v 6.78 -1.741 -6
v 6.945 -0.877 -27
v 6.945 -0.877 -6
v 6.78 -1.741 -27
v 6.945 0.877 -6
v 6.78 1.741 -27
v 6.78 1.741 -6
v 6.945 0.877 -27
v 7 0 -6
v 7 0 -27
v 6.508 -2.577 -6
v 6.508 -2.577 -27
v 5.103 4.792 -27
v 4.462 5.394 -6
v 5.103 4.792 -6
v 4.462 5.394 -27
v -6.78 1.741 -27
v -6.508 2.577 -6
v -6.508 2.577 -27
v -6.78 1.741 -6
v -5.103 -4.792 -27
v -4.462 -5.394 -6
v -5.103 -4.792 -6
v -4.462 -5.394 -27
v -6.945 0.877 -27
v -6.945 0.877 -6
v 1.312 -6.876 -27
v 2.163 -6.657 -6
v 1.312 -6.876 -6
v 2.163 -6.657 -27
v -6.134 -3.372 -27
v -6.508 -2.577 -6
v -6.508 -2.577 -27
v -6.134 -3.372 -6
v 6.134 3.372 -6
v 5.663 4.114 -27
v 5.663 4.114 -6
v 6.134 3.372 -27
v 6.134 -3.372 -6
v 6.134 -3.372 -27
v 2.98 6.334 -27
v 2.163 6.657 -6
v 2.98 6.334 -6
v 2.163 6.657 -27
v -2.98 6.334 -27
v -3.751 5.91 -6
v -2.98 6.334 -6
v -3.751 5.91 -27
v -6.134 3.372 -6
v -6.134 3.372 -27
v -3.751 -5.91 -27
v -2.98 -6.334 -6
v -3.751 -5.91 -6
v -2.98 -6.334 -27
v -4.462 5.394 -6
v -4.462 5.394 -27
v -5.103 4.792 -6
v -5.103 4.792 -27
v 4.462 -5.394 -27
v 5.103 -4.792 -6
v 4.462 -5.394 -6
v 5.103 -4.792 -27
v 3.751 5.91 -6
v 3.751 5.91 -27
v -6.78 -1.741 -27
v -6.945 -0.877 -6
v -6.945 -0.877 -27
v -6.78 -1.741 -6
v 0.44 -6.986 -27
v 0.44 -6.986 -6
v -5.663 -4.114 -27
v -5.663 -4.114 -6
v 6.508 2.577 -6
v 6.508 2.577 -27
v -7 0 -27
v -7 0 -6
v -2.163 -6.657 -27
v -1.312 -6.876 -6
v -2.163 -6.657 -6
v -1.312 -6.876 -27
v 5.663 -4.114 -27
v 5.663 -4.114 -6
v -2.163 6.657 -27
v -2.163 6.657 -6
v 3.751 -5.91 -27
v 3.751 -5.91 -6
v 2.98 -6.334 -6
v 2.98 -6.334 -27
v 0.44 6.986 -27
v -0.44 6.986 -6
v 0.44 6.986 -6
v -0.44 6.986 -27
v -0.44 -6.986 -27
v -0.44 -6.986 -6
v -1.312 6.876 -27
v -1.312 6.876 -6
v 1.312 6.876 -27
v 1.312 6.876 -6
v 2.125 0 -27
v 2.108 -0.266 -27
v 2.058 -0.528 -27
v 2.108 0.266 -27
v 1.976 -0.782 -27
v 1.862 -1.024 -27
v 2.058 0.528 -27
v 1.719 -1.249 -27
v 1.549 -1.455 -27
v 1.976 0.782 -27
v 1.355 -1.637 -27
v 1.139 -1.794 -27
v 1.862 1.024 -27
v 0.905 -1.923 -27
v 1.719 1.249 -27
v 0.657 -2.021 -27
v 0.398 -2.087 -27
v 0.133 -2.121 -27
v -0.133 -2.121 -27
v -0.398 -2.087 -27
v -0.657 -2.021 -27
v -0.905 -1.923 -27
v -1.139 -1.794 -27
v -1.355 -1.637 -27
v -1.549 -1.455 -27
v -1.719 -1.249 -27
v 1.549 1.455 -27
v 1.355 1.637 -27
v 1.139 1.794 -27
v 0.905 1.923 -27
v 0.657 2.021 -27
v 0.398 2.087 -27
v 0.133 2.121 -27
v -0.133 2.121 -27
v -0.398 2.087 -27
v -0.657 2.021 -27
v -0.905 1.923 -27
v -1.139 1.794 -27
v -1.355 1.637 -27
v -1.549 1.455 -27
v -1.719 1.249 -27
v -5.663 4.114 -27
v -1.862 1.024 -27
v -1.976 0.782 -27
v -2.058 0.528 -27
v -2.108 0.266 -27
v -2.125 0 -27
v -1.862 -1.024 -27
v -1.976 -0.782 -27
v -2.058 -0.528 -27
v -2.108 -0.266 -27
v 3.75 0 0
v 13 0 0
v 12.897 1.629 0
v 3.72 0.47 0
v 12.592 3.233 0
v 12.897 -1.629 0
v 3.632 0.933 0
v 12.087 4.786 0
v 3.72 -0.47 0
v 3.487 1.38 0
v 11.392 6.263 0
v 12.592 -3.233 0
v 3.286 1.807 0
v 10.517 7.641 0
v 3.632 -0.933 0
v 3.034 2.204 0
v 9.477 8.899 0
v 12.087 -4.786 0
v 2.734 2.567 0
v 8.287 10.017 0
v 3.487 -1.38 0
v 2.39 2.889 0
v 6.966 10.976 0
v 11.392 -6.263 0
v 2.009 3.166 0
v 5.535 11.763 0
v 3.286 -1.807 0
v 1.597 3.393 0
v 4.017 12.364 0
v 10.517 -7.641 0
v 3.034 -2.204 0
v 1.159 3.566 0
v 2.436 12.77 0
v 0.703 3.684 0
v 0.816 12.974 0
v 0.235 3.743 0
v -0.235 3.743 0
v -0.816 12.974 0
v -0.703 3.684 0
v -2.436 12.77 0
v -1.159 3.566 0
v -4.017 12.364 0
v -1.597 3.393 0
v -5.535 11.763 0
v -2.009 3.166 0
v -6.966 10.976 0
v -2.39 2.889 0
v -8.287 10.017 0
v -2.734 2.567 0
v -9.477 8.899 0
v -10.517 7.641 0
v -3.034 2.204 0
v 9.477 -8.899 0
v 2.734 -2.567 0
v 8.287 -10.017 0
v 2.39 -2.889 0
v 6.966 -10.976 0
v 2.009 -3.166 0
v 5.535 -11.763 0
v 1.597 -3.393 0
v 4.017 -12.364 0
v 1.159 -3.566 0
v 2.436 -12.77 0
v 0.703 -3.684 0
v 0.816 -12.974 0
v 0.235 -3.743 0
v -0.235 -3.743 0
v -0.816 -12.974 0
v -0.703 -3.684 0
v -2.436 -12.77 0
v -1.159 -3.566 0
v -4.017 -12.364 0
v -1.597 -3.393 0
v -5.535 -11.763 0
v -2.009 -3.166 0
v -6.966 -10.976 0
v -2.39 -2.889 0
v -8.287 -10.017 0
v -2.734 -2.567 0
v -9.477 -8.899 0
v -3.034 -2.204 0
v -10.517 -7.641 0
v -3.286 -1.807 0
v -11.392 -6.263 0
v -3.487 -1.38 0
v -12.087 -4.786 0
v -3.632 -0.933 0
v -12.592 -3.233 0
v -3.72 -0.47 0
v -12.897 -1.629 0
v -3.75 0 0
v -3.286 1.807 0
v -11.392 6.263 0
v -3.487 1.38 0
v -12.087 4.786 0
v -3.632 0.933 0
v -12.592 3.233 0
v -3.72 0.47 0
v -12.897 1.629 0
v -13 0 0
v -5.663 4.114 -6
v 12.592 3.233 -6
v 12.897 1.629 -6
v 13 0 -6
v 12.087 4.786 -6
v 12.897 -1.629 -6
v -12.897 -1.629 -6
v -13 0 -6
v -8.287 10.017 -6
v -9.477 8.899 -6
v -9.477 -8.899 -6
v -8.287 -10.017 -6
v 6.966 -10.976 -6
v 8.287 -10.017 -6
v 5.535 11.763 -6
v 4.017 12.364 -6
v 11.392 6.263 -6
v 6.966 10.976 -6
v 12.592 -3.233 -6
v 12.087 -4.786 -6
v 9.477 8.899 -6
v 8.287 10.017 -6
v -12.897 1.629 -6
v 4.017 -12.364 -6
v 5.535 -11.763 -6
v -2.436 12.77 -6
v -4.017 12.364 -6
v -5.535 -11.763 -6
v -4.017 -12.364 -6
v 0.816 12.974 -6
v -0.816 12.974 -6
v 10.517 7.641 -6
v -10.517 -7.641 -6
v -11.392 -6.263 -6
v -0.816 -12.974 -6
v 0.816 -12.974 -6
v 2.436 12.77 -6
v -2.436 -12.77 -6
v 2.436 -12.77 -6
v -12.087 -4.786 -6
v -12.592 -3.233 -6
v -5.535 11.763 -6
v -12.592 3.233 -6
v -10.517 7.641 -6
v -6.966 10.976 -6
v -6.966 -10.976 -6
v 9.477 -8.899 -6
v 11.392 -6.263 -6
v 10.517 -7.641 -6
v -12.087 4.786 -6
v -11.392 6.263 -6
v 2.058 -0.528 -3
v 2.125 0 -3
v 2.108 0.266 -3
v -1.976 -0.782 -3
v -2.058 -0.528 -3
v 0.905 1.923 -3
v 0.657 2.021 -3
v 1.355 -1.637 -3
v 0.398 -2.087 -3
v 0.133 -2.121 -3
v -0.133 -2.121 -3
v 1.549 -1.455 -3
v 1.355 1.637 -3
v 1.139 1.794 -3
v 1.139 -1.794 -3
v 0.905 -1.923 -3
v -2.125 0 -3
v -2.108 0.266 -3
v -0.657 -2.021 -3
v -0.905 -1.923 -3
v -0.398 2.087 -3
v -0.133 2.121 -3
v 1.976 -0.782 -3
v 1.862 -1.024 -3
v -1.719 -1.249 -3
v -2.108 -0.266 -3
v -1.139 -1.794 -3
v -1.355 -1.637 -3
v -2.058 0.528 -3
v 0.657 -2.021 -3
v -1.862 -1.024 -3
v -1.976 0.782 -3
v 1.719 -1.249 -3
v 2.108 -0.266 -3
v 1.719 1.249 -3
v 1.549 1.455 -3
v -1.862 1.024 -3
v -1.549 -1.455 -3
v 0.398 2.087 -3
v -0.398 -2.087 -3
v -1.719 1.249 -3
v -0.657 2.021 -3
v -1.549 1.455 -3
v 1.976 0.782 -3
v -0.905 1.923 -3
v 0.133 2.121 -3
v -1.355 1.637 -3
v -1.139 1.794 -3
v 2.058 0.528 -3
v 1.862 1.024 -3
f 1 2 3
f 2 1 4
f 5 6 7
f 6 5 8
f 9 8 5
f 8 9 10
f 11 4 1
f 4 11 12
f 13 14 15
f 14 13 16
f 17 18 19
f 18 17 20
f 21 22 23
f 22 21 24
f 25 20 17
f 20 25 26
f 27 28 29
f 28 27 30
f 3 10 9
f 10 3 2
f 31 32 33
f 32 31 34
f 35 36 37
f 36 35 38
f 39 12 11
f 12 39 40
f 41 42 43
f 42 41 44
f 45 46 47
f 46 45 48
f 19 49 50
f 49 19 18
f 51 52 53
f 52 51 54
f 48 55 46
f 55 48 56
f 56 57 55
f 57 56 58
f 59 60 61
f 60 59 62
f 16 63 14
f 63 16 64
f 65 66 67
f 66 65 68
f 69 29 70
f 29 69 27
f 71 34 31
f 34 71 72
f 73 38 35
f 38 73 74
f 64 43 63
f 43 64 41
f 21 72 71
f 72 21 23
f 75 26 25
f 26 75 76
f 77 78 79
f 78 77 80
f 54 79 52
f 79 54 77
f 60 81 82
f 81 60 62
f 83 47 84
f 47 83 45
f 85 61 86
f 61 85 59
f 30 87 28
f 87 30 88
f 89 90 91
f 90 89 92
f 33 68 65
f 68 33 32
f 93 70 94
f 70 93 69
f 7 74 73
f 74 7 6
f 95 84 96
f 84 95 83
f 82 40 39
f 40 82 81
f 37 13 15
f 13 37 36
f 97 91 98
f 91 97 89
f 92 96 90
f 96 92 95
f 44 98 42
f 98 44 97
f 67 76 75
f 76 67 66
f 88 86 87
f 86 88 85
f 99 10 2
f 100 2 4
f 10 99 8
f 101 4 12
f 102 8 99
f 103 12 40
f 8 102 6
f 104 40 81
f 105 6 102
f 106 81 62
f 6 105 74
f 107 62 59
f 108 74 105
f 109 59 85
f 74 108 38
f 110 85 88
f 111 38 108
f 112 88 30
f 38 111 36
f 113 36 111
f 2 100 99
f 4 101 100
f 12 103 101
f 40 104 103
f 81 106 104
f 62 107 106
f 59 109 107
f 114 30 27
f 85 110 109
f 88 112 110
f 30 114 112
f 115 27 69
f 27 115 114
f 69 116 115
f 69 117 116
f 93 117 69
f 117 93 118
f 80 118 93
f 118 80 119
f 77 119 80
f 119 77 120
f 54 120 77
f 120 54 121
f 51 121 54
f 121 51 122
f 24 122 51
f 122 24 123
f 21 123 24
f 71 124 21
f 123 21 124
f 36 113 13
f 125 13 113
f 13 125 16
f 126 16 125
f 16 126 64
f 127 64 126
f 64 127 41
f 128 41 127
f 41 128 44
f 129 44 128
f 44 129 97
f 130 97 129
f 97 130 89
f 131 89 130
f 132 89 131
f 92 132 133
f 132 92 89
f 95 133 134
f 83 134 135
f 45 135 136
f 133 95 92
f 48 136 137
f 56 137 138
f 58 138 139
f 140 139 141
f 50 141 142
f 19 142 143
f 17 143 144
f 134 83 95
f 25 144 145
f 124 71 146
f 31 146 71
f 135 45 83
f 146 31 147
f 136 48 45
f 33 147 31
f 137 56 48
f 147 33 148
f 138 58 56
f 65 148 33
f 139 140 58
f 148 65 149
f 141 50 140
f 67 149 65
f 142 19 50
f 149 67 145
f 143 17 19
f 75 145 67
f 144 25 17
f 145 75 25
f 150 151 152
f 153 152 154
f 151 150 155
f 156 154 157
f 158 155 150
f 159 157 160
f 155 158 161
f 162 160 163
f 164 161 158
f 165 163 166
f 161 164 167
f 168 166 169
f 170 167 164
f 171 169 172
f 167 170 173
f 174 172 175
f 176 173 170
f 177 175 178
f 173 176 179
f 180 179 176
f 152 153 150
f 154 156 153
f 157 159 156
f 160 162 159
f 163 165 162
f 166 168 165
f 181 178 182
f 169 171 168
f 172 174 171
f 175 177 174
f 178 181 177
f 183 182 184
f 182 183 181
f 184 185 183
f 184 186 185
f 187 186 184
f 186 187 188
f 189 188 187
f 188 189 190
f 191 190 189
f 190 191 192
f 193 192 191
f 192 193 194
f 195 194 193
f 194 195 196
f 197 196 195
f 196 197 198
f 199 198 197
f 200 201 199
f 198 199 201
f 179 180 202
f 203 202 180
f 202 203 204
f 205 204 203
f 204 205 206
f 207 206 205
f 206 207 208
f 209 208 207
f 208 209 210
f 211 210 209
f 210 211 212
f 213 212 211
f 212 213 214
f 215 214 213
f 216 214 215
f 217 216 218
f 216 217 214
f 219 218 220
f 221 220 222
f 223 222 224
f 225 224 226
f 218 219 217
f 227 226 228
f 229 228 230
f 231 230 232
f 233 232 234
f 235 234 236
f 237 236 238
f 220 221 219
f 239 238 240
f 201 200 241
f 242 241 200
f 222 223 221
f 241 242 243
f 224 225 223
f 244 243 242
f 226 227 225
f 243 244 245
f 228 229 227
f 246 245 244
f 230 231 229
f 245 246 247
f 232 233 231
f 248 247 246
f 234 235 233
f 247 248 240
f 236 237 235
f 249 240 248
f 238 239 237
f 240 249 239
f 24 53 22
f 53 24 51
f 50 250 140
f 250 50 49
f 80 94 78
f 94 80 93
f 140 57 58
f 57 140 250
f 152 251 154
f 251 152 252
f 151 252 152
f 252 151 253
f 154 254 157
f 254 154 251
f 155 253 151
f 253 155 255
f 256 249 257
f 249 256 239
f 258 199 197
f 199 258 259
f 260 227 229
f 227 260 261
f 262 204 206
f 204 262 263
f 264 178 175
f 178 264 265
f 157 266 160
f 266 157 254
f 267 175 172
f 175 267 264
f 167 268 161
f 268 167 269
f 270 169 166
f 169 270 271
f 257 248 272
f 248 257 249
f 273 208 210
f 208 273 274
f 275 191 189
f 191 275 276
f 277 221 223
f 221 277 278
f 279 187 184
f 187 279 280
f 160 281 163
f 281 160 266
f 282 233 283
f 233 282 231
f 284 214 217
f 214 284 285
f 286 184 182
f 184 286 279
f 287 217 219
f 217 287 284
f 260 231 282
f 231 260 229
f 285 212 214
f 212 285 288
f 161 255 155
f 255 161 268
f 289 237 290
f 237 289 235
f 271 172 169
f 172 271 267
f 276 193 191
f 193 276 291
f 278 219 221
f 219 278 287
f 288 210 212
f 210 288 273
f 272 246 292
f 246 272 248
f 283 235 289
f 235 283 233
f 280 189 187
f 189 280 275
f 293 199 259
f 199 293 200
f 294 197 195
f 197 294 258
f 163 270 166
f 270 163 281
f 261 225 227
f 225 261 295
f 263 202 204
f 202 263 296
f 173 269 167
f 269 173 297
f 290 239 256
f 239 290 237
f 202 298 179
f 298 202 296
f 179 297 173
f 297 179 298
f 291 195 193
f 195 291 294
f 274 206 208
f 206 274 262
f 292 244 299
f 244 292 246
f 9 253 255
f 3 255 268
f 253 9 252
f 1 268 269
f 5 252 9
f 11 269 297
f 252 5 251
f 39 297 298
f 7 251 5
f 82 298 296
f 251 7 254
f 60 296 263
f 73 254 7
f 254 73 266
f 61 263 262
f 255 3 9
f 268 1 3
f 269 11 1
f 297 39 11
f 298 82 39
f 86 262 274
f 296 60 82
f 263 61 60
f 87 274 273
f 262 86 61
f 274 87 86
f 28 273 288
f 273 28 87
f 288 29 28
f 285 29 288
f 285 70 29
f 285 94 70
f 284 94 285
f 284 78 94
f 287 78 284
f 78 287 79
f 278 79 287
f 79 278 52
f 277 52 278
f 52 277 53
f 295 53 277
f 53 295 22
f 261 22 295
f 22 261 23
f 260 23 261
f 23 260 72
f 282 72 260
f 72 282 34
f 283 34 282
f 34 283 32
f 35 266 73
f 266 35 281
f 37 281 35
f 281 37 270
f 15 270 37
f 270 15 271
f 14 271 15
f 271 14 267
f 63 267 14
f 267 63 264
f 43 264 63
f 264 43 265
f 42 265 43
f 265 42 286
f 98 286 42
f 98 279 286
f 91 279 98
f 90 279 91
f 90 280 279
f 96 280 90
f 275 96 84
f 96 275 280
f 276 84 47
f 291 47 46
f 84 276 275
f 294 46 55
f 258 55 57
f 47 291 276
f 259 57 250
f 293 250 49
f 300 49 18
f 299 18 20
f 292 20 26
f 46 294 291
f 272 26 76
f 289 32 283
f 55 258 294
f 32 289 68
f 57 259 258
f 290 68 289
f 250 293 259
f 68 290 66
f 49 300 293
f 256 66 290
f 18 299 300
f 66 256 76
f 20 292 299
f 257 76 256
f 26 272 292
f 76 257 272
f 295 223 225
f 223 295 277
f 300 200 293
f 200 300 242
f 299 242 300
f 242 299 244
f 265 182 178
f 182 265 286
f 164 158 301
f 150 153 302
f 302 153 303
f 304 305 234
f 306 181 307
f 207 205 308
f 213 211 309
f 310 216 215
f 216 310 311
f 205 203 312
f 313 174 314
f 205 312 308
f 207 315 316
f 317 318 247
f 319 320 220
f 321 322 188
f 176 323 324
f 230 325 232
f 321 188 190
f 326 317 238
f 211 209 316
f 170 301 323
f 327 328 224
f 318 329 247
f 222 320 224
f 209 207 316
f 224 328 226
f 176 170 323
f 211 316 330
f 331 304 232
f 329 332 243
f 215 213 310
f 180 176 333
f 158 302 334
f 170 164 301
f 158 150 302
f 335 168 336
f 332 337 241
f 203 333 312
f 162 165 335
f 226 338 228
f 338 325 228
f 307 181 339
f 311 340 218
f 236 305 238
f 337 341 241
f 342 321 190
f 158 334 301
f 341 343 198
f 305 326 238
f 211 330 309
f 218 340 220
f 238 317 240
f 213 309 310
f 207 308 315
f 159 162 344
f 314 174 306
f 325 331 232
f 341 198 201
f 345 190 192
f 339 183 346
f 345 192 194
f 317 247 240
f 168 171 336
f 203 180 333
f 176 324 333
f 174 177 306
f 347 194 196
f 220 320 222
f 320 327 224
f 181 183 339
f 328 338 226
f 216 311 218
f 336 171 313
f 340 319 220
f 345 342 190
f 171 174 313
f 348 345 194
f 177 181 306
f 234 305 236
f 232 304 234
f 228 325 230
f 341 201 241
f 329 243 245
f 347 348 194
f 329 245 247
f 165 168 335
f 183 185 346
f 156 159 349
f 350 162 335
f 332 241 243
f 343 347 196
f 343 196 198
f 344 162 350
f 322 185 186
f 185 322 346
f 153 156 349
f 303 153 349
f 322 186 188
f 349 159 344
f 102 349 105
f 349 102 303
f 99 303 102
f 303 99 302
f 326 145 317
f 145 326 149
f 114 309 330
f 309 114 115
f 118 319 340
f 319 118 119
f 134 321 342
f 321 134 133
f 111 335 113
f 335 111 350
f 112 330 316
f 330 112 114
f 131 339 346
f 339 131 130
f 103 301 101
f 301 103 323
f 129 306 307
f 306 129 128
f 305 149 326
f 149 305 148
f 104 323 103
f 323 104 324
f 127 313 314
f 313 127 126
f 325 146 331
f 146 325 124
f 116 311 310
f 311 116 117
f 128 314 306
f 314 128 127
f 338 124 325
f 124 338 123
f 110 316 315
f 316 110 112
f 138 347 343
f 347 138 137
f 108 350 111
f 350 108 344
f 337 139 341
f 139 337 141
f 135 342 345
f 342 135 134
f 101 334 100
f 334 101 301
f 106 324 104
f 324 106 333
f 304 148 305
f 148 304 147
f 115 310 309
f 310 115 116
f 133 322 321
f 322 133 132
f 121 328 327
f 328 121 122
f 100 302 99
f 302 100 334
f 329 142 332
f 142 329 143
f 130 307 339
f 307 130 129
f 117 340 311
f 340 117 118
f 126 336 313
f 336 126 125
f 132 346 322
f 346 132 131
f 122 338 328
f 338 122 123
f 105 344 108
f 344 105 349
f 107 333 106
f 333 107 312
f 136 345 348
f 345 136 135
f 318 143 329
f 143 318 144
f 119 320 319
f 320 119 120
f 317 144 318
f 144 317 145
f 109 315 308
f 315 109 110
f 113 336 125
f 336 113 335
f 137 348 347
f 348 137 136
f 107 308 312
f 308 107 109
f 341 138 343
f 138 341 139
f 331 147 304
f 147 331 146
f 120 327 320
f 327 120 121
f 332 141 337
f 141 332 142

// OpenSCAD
$fn = 50;


difference() {
	union() {
		translate(v = [0, 0, -27.0000000000]) {
			cylinder(h = 27, r = 7.0000000000);
		}
		translate(v = [0, 0, -6.0000000000]) {
			cylinder(h = 6, r = 13.0000000000);
		}
	}
	union() {
		translate(v = [0, 0, 0]) {
			rotate(a = [0, 0, 0]) {
				difference() {
					union() {
						#translate(v = [0, 0, -27.0000000000]) {
							cylinder(h = 27, r = 2.0000000000);
						}
						#translate(v = [0, 0, -3]) {
							cylinder(h = 3, r = 7.0000000000, r1 = 2.1250000000, r2 = 3.7500000000);
						}
						#translate(v = [0, 0, -27.0000000000]) {
							cylinder(h = 27, r = 2.1250000000);
						}
						#translate(v = [0, 0, -27.0000000000]) {
							cylinder(h = 27, r = 2.0000000000);
						}
					}
					union();
				}
			}
		}
	}
}
